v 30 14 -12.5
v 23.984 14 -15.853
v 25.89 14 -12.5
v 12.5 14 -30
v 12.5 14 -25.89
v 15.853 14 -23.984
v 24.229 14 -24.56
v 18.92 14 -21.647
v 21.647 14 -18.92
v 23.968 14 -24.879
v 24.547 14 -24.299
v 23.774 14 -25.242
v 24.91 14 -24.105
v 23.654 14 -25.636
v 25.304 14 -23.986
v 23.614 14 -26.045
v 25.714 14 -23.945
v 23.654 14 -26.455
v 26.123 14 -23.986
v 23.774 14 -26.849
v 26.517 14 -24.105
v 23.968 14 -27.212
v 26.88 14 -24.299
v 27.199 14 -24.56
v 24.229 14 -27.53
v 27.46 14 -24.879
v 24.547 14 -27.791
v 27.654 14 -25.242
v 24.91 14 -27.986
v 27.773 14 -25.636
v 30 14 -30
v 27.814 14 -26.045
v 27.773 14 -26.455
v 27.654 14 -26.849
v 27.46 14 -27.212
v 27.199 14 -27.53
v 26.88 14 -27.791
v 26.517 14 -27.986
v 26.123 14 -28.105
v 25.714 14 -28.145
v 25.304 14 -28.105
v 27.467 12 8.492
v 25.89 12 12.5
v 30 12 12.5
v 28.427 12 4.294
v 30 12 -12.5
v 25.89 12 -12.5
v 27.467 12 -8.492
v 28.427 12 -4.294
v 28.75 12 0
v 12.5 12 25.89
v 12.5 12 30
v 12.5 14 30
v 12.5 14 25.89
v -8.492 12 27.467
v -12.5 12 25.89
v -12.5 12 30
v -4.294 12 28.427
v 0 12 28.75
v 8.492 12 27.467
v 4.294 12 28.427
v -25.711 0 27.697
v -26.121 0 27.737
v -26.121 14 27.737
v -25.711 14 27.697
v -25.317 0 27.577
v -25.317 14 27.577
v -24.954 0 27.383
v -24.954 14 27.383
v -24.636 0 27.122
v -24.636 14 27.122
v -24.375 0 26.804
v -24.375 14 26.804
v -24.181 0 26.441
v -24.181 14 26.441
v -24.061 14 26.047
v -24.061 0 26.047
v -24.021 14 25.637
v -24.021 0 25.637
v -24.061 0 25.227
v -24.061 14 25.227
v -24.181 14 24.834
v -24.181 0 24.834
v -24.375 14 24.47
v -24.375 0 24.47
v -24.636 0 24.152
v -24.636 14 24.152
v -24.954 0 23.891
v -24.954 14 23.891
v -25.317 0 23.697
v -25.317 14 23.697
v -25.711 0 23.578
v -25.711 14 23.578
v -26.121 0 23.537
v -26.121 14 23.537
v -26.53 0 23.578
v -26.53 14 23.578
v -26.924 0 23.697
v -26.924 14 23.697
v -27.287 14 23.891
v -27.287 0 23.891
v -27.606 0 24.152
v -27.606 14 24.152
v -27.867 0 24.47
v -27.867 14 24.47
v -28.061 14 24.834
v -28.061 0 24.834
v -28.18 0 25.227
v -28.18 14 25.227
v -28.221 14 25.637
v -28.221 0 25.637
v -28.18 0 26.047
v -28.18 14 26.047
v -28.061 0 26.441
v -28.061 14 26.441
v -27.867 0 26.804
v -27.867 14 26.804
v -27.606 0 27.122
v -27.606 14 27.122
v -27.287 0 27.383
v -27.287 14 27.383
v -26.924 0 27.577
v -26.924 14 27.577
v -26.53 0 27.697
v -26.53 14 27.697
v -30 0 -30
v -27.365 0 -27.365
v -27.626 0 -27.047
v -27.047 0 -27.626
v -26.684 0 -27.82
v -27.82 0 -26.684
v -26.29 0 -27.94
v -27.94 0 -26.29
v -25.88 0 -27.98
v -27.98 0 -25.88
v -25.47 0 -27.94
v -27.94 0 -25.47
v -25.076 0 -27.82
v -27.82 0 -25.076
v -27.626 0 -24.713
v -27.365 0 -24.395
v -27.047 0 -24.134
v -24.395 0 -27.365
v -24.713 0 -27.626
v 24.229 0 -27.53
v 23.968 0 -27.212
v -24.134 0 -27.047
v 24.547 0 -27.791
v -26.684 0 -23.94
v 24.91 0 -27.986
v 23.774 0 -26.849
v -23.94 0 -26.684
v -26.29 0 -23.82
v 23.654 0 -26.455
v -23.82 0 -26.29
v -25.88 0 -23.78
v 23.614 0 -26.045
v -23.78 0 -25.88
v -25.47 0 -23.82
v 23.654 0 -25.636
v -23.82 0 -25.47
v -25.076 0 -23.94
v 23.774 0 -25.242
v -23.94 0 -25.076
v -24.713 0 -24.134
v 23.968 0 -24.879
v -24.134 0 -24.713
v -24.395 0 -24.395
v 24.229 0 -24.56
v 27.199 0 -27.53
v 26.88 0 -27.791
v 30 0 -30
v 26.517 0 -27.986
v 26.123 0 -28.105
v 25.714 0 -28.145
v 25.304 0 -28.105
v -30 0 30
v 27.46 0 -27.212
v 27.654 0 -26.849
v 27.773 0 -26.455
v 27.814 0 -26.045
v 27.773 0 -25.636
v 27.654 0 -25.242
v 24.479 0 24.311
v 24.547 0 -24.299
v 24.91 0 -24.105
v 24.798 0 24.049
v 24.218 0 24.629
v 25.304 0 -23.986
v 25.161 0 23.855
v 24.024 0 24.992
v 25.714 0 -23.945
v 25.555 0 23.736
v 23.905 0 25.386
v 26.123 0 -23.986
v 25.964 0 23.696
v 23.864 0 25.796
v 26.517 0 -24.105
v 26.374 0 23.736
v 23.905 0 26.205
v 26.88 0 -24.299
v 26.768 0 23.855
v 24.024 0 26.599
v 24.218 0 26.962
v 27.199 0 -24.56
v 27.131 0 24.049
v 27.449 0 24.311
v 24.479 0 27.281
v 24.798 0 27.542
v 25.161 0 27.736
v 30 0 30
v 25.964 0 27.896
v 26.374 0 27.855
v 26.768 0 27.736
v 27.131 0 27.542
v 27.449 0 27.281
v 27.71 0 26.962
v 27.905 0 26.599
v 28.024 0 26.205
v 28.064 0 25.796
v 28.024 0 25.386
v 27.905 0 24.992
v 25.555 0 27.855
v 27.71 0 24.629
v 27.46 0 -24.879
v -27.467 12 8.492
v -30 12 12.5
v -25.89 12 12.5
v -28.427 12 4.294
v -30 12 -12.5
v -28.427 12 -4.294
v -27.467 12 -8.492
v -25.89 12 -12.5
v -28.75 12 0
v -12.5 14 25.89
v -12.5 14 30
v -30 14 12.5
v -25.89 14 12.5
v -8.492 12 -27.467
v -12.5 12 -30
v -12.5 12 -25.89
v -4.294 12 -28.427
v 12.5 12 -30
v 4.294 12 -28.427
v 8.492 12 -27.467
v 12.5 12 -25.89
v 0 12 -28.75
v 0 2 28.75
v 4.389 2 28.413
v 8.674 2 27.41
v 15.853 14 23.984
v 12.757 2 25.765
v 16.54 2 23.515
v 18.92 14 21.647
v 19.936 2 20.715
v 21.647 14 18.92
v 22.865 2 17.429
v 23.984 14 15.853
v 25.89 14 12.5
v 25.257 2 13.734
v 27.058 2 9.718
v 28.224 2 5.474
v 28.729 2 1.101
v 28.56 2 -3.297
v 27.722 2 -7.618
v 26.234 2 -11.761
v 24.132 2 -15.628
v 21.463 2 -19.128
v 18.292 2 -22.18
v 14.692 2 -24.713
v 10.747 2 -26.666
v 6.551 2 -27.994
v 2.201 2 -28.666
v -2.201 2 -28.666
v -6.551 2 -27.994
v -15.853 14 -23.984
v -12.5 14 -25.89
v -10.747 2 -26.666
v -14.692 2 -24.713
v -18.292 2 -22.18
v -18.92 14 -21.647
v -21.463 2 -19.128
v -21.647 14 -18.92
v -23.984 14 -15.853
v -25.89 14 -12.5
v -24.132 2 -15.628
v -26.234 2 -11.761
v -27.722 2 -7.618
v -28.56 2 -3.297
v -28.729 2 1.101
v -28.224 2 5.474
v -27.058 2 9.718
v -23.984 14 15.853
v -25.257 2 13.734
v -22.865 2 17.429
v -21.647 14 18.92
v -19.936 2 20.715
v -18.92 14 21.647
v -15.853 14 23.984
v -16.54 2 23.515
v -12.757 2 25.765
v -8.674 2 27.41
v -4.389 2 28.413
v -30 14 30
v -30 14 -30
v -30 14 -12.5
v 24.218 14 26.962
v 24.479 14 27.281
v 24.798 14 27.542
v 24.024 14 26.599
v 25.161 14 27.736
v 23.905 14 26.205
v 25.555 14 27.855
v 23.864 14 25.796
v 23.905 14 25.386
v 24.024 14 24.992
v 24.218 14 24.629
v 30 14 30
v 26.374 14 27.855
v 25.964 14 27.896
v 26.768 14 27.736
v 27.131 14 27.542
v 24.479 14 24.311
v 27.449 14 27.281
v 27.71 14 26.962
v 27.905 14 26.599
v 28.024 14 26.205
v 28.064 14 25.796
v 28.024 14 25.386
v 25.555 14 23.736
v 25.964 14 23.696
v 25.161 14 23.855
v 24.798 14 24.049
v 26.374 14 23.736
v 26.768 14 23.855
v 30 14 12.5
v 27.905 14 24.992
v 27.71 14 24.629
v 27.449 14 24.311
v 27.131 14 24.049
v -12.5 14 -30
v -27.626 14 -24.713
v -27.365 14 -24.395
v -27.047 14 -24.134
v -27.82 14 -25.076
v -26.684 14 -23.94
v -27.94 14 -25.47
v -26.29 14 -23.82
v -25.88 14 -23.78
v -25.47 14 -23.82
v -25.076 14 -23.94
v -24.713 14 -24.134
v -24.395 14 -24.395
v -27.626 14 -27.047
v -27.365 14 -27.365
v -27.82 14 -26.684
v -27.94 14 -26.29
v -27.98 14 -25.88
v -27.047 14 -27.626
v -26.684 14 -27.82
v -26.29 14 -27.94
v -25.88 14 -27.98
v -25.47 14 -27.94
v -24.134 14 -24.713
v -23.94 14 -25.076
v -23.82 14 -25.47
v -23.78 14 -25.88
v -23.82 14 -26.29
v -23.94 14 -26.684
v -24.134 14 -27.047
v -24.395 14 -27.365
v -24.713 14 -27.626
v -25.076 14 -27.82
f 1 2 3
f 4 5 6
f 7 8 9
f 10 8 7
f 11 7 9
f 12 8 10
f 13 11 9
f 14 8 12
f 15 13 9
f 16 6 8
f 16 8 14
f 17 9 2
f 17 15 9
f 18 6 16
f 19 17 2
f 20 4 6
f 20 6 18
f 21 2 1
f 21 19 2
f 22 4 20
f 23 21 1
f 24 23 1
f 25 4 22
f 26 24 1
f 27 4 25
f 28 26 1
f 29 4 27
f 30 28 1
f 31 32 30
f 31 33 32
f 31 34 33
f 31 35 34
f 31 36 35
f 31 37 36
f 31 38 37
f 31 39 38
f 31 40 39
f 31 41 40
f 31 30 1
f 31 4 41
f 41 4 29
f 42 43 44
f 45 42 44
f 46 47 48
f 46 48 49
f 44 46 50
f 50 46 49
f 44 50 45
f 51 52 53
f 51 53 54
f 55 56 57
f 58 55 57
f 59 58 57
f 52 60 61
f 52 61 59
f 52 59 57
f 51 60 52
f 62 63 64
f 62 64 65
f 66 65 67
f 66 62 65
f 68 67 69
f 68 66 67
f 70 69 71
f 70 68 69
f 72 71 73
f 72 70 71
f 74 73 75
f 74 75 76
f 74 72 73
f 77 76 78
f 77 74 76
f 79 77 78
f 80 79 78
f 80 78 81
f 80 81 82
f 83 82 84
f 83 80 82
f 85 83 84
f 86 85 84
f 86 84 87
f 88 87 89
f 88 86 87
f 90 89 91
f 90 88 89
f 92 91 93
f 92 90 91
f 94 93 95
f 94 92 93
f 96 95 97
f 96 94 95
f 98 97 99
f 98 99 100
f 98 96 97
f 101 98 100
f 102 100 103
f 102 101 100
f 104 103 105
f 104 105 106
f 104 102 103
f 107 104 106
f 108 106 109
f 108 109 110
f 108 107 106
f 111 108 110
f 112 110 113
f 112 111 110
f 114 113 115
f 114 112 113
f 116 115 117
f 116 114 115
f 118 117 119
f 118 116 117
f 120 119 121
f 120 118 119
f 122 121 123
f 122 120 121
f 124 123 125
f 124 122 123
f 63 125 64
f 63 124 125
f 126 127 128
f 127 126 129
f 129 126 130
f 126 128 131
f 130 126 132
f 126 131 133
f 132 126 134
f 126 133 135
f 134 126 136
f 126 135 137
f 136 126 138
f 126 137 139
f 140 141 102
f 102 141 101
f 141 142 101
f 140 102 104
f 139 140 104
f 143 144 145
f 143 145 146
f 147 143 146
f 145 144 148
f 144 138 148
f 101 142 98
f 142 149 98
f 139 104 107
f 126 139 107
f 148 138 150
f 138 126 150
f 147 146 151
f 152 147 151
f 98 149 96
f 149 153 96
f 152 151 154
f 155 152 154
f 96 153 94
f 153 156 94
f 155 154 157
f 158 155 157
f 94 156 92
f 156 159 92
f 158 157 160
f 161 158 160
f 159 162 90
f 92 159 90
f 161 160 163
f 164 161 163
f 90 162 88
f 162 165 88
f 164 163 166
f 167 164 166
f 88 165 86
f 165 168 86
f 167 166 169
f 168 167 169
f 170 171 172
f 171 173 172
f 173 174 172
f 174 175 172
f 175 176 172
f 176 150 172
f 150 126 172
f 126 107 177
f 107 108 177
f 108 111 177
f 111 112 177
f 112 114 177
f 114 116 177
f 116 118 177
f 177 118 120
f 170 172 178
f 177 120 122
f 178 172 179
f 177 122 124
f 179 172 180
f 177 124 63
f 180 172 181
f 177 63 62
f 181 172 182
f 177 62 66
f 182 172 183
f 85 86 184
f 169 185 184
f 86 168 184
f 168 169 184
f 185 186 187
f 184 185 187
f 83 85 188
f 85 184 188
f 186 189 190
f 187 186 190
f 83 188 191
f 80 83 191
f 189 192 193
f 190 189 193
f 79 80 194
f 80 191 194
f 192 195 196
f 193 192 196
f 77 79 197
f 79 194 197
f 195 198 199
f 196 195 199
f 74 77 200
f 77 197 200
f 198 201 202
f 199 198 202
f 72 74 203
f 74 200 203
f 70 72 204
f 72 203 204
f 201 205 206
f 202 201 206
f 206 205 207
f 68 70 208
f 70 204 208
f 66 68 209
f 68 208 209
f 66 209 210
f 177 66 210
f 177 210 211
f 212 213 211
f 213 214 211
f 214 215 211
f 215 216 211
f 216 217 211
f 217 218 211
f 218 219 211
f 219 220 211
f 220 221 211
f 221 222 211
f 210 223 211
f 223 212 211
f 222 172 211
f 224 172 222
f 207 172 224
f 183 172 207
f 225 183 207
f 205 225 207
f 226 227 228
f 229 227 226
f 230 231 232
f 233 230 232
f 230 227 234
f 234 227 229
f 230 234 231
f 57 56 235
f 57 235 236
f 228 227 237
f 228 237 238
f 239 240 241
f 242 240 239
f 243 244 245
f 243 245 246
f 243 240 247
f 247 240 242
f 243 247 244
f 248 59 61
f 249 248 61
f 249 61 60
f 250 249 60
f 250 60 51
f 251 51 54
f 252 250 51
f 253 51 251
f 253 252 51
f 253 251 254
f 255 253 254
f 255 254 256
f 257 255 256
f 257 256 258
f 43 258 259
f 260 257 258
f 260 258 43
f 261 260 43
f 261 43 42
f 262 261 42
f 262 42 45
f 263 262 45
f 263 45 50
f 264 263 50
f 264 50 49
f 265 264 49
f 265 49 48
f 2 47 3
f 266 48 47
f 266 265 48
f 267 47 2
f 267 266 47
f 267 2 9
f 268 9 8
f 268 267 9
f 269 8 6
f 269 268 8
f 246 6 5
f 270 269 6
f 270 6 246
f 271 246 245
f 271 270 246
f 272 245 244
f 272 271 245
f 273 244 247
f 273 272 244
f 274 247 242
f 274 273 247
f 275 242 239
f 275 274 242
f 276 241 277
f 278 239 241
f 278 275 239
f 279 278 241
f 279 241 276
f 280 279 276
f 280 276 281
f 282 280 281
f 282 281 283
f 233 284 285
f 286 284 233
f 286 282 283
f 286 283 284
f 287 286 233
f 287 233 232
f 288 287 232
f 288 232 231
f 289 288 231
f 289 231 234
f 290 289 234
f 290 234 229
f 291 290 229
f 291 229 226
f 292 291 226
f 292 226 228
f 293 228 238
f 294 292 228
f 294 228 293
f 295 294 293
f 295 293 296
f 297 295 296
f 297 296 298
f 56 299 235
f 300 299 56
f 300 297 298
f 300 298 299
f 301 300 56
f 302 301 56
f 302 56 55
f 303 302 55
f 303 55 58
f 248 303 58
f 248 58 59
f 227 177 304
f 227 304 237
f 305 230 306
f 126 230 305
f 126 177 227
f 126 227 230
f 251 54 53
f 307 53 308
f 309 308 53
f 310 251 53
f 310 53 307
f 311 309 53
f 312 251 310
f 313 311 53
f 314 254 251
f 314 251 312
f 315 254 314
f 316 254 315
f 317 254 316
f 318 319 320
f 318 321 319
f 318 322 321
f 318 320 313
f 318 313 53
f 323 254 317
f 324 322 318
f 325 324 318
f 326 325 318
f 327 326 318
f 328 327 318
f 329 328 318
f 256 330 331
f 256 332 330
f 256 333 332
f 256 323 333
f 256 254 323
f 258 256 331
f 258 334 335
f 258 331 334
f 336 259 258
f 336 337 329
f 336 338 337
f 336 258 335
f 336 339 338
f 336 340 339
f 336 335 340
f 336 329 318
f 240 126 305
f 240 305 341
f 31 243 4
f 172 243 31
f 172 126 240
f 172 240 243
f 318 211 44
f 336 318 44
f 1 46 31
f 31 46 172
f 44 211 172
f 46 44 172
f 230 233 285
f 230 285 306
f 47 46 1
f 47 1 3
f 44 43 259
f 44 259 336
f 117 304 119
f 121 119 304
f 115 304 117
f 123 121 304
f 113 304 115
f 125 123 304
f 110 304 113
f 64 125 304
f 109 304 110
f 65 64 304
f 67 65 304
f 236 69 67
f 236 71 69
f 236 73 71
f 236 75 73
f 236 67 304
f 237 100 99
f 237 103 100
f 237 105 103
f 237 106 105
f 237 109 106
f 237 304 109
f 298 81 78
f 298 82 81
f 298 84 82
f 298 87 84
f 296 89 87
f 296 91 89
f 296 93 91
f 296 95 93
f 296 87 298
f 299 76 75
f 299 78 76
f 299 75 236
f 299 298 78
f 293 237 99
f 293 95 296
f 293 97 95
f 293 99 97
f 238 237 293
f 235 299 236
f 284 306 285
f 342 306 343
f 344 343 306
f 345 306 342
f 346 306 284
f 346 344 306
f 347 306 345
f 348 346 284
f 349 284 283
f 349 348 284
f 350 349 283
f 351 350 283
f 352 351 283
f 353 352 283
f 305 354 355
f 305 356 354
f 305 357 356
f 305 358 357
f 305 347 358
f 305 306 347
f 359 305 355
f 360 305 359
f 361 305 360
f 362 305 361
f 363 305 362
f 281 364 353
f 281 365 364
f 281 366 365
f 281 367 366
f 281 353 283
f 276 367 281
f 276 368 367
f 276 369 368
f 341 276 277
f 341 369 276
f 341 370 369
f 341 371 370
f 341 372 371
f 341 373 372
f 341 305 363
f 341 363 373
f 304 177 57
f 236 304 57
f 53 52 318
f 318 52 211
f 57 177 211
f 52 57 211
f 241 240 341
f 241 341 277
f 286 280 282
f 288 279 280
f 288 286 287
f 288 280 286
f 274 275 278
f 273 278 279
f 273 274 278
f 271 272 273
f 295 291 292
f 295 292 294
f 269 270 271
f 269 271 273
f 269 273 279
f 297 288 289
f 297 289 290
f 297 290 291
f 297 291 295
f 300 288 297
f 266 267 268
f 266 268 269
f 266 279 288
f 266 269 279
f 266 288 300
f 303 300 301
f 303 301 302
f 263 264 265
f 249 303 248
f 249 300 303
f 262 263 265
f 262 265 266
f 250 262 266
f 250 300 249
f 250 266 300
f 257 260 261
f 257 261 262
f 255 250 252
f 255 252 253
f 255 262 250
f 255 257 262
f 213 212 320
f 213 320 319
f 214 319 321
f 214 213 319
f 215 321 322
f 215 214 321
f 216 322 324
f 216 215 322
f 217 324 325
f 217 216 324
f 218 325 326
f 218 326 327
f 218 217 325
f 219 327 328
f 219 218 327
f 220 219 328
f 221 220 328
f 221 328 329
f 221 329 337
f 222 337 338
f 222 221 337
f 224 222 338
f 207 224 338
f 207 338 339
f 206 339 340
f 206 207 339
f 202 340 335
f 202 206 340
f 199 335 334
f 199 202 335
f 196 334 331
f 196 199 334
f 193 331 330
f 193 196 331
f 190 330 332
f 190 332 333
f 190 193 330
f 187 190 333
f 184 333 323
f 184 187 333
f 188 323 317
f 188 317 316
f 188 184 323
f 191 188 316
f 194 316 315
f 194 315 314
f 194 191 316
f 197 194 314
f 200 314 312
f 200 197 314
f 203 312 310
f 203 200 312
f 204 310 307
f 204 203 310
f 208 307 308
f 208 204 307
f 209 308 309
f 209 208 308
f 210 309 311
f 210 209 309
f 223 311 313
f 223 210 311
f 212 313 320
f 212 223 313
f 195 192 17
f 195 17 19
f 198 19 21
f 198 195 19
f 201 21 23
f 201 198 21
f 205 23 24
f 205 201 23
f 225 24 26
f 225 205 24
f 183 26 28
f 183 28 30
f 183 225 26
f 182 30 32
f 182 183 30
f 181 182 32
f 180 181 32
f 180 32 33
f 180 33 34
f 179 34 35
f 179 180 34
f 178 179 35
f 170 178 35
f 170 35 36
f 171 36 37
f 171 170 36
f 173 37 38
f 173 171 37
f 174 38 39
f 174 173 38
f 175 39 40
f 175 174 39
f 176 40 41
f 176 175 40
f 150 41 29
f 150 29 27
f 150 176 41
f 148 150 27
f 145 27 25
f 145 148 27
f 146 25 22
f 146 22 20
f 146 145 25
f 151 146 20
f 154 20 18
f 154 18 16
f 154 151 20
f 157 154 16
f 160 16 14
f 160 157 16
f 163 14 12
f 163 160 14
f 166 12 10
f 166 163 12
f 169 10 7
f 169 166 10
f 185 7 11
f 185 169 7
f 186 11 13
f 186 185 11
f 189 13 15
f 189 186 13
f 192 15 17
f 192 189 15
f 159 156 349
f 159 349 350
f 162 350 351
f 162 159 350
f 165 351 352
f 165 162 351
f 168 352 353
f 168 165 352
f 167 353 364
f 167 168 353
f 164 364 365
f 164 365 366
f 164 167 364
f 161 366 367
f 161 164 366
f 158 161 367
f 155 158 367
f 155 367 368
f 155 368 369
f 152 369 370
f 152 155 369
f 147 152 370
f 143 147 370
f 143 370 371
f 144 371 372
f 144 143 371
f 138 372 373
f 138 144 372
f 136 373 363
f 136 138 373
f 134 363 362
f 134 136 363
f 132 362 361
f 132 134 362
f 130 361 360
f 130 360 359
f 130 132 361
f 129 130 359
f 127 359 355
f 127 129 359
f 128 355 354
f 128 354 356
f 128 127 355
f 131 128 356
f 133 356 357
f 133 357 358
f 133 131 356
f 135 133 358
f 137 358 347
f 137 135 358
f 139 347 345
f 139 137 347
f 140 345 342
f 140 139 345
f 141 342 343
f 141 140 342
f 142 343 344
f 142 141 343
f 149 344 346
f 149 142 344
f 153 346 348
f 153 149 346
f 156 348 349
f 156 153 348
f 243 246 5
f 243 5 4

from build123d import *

# Parameters (mm, degrees)
SKETCH1_W           = 60
SKETCH1_H           = 60
SKETCH1_R           = 28.75
SKETCH1_R_2         = 2.1
BOSS_EXTRUDE4_DEPTH = 14
SKETCH1_8_R         = 28.75
BOSS_EXTRUDE5_DEPTH = 2
CUT_EXTRUDE2_START  = -2
CUT_EXTRUDE2_DEPTH  = 2


with BuildPart() as part:
    # Sketch1 → Boss-Extrude4 (new body)
    with BuildSketch(Plane(origin=(0, 0, 0), x_dir=(1, 0, 0), z_dir=(0, 1, 0))):
        Rectangle(SKETCH1_W, SKETCH1_H)
        Circle(SKETCH1_R, mode=Mode.SUBTRACT)
        with Locations((-25.880108191, 25.880108191)):
            Circle(SKETCH1_R_2, mode=Mode.SUBTRACT)
        with Locations((-26.120769668, -25.637187677)):
            Circle(SKETCH1_R_2, mode=Mode.SUBTRACT)
        with Locations((25.96435834, -25.795582877)):
            Circle(SKETCH1_R_2, mode=Mode.SUBTRACT)
        with Locations((25.713774072, 26.04538007)):
            Circle(SKETCH1_R_2, mode=Mode.SUBTRACT)
    extrude(amount=BOSS_EXTRUDE4_DEPTH)

    # Sketch1<8> → Boss-Extrude5 (add)
    with BuildSketch(Plane(origin=(0, 0, 0), x_dir=(1, 0, 0), z_dir=(0, 1, 0))):
        Circle(SKETCH1_8_R)
    extrude(amount=BOSS_EXTRUDE5_DEPTH)

    # Sketch5 → Cut-Extrude2 (cut)
    with BuildSketch(Plane(origin=(0, 14, 0), x_dir=(1, 0, 0), z_dir=(0, 1, 0)).offset(CUT_EXTRUDE2_START)):
        with BuildLine():
            Line((12.5, 30), (-12.5, 30))
            Line((-12.5, 30), (-12.5, 25.890393972))
            ThreePointArc((-12.5, 25.890393972), (0, 28.75), (12.5, 25.890393972))
            Line((12.5, 25.890393972), (12.5, 30))
        make_face()
        with BuildLine():
            ThreePointArc((-25.890393972, -12.5), (-28.75, 0), (-25.890393972, 12.5))
            Line((-25.890393972, 12.5), (-30, 12.5))
            Line((-30, 12.5), (-30, -12.5))
            Line((-30, -12.5), (-25.890393972, -12.5))
        make_face()
        with BuildLine():
            Line((30, 12.5), (25.890393972, 12.5))
            ThreePointArc((25.890393972, 12.5), (28.75, 0), (25.890393972, -12.5))
            Line((25.890393972, -12.5), (30, -12.5))
            Line((30, -12.5), (30, 12.5))
        make_face()
        with BuildLine():
            ThreePointArc((12.5, -25.890393972), (0, -28.75), (-12.5, -25.890393972))
            Line((-12.5, -25.890393972), (-12.5, -30))
            Line((-12.5, -30), (12.5, -30))
            Line((12.5, -30), (12.5, -25.890393972))
        make_face()
    extrude(amount=CUT_EXTRUDE2_DEPTH, mode=Mode.SUBTRACT)


solid = part.part
